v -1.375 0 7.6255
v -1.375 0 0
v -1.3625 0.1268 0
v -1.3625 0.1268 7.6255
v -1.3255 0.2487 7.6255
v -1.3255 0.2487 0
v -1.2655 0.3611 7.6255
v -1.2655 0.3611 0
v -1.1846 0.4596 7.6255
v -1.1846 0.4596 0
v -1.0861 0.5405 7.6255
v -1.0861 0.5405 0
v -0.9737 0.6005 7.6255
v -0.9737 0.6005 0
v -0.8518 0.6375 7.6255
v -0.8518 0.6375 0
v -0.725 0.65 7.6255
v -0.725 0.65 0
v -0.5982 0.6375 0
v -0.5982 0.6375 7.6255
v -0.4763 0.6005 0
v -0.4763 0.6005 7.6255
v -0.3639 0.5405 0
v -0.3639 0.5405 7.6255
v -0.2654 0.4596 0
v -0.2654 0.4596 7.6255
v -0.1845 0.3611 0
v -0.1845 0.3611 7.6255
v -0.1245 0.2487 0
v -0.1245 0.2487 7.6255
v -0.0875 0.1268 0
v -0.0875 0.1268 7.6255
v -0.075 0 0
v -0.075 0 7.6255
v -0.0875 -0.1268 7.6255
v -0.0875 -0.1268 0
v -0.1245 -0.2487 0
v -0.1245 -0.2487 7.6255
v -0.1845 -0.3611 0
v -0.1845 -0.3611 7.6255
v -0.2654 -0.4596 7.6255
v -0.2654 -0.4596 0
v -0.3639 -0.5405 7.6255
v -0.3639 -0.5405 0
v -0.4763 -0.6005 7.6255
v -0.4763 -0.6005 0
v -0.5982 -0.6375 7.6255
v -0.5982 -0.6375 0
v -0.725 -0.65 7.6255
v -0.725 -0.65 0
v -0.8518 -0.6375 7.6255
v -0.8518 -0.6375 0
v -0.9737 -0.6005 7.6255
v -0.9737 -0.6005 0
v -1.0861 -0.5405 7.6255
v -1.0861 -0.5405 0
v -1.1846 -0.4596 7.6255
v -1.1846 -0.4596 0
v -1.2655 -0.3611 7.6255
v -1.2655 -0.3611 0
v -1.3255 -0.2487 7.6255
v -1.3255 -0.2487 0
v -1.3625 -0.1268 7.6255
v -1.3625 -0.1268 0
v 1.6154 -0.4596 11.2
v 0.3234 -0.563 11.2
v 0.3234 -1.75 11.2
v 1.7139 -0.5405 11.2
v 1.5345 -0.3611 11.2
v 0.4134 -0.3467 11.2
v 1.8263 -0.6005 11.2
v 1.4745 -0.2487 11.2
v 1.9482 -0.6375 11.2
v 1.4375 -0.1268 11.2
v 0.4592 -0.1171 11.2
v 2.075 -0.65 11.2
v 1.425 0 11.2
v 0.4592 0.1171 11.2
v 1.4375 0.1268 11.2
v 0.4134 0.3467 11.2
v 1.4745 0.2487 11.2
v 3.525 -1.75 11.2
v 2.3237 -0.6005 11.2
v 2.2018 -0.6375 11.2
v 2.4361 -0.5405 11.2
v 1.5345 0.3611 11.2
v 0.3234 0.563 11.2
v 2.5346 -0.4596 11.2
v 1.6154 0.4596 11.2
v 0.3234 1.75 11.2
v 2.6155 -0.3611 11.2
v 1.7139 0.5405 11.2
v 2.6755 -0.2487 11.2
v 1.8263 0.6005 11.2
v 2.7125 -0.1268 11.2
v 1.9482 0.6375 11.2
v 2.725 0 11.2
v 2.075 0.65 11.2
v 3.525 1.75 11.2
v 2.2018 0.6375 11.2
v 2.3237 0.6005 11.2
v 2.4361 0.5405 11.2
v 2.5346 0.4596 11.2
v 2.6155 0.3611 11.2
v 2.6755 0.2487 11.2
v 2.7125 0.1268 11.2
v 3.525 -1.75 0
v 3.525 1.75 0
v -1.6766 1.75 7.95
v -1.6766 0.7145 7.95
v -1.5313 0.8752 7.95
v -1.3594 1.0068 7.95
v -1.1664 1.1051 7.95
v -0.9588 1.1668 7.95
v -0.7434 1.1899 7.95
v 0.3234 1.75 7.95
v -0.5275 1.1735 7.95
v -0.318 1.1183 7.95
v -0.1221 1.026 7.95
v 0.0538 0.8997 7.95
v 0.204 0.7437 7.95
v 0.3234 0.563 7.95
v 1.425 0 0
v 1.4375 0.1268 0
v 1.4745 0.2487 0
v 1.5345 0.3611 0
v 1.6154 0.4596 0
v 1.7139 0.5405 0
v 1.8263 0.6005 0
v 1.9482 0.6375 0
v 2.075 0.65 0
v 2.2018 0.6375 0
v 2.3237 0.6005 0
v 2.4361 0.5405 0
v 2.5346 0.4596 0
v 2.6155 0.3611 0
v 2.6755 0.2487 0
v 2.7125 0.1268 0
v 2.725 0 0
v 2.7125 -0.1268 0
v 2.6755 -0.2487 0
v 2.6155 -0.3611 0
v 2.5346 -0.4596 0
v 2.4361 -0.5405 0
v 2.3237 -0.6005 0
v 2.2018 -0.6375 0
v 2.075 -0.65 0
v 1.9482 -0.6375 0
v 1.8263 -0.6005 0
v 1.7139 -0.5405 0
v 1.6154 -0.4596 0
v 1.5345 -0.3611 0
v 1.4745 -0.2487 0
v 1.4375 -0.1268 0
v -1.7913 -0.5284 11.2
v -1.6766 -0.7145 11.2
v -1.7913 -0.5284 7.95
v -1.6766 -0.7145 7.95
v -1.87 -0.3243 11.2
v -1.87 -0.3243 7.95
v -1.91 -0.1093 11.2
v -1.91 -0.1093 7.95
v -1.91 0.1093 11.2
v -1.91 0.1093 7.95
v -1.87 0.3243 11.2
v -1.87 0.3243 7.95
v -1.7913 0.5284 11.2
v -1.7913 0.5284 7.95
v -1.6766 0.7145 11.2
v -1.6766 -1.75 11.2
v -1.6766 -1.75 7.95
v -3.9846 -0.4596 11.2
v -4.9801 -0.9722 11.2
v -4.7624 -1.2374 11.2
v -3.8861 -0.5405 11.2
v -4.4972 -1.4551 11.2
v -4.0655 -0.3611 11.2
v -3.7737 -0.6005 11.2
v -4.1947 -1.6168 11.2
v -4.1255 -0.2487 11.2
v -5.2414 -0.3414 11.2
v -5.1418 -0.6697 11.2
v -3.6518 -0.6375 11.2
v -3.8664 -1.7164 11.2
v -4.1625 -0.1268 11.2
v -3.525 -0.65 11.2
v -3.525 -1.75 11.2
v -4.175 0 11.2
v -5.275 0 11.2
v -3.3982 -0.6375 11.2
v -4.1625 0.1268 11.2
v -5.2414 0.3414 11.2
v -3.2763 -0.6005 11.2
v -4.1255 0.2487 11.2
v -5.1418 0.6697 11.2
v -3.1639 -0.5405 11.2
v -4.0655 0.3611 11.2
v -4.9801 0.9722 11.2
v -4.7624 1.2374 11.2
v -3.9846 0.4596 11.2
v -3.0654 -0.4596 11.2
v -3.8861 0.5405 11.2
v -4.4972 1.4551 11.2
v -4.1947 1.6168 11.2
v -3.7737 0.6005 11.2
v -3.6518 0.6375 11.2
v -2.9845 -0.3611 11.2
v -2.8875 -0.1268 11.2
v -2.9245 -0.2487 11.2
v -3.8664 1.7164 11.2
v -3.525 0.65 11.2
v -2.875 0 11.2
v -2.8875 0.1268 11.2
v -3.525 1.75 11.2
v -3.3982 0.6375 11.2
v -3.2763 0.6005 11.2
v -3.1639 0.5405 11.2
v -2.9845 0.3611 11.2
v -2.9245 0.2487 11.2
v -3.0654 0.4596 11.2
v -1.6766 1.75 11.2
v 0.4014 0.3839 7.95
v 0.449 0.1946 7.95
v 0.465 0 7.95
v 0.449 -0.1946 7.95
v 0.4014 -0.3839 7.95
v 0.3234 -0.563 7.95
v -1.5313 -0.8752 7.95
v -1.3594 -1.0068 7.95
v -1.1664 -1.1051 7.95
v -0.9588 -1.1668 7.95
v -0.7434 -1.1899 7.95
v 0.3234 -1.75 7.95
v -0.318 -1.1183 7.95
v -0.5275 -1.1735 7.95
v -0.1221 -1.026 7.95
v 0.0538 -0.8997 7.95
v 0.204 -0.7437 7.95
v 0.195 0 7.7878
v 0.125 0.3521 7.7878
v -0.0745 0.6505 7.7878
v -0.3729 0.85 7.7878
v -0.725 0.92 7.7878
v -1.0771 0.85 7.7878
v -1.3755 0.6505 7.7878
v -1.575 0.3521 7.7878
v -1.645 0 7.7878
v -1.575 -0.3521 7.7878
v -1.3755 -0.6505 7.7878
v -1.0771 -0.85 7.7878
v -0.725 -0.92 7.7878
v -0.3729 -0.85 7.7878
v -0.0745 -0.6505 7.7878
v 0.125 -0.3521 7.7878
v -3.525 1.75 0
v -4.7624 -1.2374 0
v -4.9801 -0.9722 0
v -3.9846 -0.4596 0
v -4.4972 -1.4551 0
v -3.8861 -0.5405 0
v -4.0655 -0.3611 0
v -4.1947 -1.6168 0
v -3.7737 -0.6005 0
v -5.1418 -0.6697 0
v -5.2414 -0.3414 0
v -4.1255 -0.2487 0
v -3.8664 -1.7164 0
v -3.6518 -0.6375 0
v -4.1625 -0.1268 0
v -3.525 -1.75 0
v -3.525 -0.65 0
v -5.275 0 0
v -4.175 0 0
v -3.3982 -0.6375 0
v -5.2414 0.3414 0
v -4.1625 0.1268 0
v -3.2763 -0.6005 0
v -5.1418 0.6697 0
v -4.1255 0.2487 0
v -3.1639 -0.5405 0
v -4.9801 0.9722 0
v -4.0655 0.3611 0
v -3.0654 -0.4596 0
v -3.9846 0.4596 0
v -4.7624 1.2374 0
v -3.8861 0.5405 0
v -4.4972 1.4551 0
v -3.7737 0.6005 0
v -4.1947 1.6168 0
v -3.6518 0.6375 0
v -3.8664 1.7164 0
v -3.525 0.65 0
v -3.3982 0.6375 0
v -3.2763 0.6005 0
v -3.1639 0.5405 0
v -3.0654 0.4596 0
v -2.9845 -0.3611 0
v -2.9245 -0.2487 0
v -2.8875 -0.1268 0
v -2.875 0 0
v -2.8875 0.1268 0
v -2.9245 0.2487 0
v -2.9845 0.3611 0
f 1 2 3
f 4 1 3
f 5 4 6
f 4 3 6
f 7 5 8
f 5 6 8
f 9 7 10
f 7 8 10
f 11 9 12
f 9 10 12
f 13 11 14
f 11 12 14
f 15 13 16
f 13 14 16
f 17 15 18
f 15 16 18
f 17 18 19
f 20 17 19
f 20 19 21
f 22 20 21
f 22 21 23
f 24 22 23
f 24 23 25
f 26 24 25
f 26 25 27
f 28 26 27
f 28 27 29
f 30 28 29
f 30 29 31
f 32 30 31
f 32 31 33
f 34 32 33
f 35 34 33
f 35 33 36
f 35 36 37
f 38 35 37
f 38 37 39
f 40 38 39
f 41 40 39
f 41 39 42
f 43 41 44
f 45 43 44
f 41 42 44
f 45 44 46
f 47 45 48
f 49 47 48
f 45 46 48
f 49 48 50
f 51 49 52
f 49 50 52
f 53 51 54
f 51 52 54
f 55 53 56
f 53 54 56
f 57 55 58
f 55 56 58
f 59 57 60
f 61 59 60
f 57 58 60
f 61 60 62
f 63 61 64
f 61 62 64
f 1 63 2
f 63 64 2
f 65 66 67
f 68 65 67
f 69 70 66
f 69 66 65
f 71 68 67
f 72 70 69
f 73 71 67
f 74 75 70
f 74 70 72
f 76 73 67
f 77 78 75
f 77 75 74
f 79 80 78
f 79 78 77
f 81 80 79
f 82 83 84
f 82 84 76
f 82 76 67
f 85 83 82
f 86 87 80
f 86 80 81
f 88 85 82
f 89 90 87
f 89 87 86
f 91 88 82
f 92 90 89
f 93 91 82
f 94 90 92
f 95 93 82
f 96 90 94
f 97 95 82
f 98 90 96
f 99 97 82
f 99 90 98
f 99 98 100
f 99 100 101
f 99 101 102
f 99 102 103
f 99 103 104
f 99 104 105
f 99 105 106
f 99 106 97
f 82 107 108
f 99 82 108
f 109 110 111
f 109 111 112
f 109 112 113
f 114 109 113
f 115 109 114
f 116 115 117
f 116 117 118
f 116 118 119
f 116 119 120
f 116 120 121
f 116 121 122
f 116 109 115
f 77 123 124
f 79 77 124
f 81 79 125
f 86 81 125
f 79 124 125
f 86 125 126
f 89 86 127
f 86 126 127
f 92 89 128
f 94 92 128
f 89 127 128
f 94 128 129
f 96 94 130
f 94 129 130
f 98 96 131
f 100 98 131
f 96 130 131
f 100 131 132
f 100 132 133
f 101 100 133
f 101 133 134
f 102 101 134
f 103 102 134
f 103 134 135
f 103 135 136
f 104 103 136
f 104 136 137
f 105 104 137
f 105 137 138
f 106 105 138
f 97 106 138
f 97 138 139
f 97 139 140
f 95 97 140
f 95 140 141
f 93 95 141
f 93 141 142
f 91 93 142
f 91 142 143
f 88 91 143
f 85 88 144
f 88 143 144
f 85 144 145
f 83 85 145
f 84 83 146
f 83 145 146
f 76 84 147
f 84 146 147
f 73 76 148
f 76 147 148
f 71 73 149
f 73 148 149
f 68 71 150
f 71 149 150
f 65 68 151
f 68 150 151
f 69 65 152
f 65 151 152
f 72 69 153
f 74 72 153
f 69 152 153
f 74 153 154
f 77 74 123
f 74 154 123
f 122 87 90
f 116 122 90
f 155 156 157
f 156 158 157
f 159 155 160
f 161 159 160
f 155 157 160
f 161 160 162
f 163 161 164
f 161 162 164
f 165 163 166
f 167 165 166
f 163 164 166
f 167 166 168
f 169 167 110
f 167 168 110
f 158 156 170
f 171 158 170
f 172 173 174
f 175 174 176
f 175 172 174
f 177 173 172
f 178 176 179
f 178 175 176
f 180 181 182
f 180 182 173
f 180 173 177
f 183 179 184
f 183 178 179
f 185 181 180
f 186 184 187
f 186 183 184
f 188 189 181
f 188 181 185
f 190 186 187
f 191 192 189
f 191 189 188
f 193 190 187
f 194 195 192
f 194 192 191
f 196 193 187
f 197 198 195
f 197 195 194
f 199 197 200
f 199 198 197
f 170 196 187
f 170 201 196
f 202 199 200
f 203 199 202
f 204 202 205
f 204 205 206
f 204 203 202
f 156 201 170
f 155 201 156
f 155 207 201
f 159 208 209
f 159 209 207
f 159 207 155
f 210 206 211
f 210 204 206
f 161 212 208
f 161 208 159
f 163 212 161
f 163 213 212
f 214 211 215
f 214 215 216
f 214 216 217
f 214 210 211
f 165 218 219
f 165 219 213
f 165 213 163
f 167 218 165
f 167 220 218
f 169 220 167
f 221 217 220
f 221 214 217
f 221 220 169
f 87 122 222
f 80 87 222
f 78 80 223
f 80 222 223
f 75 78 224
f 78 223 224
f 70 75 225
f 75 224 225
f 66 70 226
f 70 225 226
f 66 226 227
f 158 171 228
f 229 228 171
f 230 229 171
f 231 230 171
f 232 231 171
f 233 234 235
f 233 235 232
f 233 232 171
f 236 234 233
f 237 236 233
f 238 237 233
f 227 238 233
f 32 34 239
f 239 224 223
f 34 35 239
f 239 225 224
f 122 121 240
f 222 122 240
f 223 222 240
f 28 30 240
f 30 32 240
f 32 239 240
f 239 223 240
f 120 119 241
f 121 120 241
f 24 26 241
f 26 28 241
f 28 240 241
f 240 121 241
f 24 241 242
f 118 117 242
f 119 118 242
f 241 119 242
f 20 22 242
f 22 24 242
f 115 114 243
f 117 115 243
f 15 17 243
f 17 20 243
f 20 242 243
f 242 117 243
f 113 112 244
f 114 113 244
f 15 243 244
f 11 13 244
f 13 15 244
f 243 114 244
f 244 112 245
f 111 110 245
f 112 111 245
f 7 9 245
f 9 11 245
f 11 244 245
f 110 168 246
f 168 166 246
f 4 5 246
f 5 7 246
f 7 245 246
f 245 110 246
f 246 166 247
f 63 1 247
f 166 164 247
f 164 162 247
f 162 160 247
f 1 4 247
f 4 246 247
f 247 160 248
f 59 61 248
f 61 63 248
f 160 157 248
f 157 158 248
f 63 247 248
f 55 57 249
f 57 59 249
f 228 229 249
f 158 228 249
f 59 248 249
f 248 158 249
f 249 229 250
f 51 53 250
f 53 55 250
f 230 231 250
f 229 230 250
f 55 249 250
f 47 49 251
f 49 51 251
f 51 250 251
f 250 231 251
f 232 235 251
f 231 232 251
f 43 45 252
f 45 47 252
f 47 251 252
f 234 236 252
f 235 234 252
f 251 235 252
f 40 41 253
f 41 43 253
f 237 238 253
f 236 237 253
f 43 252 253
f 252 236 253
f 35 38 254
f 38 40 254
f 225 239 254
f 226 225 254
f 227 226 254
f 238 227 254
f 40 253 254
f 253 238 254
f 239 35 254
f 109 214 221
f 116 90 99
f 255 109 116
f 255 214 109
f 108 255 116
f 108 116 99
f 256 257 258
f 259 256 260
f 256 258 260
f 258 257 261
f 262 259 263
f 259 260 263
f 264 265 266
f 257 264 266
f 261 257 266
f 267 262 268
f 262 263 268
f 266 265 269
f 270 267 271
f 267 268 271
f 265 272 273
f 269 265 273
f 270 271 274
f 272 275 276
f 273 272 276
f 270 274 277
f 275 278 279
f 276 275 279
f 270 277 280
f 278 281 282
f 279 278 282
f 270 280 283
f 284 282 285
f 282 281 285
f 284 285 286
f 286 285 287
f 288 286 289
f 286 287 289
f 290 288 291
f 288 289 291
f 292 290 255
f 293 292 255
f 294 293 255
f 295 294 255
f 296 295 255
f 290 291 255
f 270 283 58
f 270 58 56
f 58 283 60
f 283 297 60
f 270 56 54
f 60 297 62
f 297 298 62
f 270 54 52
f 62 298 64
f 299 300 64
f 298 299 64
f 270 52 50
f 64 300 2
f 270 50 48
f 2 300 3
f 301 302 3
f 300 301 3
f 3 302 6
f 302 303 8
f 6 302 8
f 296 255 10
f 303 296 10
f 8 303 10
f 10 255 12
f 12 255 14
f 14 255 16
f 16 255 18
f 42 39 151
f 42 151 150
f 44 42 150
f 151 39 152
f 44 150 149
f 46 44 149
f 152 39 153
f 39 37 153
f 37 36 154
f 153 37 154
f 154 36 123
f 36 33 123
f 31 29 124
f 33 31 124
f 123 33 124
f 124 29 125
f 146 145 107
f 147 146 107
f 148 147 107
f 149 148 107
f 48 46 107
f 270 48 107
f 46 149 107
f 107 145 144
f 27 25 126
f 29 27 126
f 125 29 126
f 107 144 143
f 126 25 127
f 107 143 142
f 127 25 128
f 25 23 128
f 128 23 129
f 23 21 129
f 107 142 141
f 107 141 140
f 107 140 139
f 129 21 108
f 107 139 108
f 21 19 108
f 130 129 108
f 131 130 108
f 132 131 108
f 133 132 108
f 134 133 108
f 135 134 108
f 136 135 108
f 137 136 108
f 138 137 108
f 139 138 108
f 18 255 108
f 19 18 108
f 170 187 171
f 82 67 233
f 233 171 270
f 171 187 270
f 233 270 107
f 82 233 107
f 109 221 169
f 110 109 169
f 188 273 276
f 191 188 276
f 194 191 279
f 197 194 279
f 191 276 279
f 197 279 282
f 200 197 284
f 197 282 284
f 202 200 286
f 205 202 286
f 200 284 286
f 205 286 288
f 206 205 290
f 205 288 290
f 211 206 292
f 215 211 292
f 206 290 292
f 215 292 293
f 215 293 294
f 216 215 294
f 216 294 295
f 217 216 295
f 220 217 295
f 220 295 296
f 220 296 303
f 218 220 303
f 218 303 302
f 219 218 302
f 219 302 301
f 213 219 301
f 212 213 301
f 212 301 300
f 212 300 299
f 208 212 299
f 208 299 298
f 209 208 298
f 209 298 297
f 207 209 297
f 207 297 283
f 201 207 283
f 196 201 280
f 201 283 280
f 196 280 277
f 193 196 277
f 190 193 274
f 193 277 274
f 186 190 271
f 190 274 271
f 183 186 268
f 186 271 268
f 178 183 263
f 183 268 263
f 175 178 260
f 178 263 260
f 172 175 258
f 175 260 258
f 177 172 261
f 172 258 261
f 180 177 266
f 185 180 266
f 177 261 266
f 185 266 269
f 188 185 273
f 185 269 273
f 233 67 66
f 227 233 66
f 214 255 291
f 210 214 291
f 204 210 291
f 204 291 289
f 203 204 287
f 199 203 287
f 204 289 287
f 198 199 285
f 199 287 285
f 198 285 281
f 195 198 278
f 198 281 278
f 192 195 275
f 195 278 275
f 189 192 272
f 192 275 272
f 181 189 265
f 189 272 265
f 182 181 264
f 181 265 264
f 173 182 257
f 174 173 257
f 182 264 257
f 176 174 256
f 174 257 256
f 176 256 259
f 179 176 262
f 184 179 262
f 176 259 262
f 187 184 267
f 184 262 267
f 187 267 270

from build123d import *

# Parameters (mm, degrees)
F0_W     = 7.05
F0_H     = 3.5
F1_DEPTH = 11.2
F3_D     = 2.38
F3_DEPTH = 3.25
F3_TIP   = 0.7150241366
F5_D     = 1.3
F8_DEPTH = 3.25


with BuildPart() as f1:
    # F0 (on Top) → F1 (new body)
    with BuildSketch(Plane.XY):
        Rectangle(F0_W, F0_H)
        with BuildLine():
            ThreePointArc((-3.525, 1.75), (-5.275, 0), (-3.525, -1.75))
            Line((-3.525, -1.75), (-3.525, 1.75))
        make_face()
    extrude(amount=F1_DEPTH)

    # F3
    with Locations(Plane.XY.offset(11.2)):
        with Locations((-0.725, 0)):
            Hole(F3_D / 2, depth=F3_DEPTH)
            with Locations((0, 0, -(F3_DEPTH + F3_TIP / 2))):  # 118° drill point
                Cone(0, F3_D / 2, F3_TIP, mode=Mode.SUBTRACT)

    # F5 (through all)
    with Locations(Plane.XY.offset(11.2)):
        with Locations((-3.525, 0), (-0.725, 0), (2.075, 0)):
            Hole(F5_D / 2)

    # F7 (on face) → F8 (cut)
    with BuildSketch(Plane.XY.offset(11.2)):
        with BuildLine():
            Line((-1.6765881673, -1.75), (0.3234118327, -1.75))
            Line((0.3234118327, -1.75), (0.3234118327, -0.562967698))
            ThreePointArc((0.3234118327, -0.562967698), (-0.6350671823, -1.1865968516), (-1.6765881673, -0.7145487806))
            Line((-1.6765881673, -0.7145487806), (-1.6765881673, -1.75))
        make_face()
        with BuildLine():
            ThreePointArc((-1.6765881673, 0.7145487806), (-0.6350671823, 1.1865968516), (0.3234118327, 0.562967698))
            Line((0.3234118327, 0.562967698), (0.3234118327, 1.75))
            Line((0.3234118327, 1.75), (-1.6765881673, 1.75))
            Line((-1.6765881673, 1.75), (-1.6765881673, 0.7145487806))
        make_face()
    extrude(amount=-F8_DEPTH, mode=Mode.SUBTRACT)


solid = f1.part
